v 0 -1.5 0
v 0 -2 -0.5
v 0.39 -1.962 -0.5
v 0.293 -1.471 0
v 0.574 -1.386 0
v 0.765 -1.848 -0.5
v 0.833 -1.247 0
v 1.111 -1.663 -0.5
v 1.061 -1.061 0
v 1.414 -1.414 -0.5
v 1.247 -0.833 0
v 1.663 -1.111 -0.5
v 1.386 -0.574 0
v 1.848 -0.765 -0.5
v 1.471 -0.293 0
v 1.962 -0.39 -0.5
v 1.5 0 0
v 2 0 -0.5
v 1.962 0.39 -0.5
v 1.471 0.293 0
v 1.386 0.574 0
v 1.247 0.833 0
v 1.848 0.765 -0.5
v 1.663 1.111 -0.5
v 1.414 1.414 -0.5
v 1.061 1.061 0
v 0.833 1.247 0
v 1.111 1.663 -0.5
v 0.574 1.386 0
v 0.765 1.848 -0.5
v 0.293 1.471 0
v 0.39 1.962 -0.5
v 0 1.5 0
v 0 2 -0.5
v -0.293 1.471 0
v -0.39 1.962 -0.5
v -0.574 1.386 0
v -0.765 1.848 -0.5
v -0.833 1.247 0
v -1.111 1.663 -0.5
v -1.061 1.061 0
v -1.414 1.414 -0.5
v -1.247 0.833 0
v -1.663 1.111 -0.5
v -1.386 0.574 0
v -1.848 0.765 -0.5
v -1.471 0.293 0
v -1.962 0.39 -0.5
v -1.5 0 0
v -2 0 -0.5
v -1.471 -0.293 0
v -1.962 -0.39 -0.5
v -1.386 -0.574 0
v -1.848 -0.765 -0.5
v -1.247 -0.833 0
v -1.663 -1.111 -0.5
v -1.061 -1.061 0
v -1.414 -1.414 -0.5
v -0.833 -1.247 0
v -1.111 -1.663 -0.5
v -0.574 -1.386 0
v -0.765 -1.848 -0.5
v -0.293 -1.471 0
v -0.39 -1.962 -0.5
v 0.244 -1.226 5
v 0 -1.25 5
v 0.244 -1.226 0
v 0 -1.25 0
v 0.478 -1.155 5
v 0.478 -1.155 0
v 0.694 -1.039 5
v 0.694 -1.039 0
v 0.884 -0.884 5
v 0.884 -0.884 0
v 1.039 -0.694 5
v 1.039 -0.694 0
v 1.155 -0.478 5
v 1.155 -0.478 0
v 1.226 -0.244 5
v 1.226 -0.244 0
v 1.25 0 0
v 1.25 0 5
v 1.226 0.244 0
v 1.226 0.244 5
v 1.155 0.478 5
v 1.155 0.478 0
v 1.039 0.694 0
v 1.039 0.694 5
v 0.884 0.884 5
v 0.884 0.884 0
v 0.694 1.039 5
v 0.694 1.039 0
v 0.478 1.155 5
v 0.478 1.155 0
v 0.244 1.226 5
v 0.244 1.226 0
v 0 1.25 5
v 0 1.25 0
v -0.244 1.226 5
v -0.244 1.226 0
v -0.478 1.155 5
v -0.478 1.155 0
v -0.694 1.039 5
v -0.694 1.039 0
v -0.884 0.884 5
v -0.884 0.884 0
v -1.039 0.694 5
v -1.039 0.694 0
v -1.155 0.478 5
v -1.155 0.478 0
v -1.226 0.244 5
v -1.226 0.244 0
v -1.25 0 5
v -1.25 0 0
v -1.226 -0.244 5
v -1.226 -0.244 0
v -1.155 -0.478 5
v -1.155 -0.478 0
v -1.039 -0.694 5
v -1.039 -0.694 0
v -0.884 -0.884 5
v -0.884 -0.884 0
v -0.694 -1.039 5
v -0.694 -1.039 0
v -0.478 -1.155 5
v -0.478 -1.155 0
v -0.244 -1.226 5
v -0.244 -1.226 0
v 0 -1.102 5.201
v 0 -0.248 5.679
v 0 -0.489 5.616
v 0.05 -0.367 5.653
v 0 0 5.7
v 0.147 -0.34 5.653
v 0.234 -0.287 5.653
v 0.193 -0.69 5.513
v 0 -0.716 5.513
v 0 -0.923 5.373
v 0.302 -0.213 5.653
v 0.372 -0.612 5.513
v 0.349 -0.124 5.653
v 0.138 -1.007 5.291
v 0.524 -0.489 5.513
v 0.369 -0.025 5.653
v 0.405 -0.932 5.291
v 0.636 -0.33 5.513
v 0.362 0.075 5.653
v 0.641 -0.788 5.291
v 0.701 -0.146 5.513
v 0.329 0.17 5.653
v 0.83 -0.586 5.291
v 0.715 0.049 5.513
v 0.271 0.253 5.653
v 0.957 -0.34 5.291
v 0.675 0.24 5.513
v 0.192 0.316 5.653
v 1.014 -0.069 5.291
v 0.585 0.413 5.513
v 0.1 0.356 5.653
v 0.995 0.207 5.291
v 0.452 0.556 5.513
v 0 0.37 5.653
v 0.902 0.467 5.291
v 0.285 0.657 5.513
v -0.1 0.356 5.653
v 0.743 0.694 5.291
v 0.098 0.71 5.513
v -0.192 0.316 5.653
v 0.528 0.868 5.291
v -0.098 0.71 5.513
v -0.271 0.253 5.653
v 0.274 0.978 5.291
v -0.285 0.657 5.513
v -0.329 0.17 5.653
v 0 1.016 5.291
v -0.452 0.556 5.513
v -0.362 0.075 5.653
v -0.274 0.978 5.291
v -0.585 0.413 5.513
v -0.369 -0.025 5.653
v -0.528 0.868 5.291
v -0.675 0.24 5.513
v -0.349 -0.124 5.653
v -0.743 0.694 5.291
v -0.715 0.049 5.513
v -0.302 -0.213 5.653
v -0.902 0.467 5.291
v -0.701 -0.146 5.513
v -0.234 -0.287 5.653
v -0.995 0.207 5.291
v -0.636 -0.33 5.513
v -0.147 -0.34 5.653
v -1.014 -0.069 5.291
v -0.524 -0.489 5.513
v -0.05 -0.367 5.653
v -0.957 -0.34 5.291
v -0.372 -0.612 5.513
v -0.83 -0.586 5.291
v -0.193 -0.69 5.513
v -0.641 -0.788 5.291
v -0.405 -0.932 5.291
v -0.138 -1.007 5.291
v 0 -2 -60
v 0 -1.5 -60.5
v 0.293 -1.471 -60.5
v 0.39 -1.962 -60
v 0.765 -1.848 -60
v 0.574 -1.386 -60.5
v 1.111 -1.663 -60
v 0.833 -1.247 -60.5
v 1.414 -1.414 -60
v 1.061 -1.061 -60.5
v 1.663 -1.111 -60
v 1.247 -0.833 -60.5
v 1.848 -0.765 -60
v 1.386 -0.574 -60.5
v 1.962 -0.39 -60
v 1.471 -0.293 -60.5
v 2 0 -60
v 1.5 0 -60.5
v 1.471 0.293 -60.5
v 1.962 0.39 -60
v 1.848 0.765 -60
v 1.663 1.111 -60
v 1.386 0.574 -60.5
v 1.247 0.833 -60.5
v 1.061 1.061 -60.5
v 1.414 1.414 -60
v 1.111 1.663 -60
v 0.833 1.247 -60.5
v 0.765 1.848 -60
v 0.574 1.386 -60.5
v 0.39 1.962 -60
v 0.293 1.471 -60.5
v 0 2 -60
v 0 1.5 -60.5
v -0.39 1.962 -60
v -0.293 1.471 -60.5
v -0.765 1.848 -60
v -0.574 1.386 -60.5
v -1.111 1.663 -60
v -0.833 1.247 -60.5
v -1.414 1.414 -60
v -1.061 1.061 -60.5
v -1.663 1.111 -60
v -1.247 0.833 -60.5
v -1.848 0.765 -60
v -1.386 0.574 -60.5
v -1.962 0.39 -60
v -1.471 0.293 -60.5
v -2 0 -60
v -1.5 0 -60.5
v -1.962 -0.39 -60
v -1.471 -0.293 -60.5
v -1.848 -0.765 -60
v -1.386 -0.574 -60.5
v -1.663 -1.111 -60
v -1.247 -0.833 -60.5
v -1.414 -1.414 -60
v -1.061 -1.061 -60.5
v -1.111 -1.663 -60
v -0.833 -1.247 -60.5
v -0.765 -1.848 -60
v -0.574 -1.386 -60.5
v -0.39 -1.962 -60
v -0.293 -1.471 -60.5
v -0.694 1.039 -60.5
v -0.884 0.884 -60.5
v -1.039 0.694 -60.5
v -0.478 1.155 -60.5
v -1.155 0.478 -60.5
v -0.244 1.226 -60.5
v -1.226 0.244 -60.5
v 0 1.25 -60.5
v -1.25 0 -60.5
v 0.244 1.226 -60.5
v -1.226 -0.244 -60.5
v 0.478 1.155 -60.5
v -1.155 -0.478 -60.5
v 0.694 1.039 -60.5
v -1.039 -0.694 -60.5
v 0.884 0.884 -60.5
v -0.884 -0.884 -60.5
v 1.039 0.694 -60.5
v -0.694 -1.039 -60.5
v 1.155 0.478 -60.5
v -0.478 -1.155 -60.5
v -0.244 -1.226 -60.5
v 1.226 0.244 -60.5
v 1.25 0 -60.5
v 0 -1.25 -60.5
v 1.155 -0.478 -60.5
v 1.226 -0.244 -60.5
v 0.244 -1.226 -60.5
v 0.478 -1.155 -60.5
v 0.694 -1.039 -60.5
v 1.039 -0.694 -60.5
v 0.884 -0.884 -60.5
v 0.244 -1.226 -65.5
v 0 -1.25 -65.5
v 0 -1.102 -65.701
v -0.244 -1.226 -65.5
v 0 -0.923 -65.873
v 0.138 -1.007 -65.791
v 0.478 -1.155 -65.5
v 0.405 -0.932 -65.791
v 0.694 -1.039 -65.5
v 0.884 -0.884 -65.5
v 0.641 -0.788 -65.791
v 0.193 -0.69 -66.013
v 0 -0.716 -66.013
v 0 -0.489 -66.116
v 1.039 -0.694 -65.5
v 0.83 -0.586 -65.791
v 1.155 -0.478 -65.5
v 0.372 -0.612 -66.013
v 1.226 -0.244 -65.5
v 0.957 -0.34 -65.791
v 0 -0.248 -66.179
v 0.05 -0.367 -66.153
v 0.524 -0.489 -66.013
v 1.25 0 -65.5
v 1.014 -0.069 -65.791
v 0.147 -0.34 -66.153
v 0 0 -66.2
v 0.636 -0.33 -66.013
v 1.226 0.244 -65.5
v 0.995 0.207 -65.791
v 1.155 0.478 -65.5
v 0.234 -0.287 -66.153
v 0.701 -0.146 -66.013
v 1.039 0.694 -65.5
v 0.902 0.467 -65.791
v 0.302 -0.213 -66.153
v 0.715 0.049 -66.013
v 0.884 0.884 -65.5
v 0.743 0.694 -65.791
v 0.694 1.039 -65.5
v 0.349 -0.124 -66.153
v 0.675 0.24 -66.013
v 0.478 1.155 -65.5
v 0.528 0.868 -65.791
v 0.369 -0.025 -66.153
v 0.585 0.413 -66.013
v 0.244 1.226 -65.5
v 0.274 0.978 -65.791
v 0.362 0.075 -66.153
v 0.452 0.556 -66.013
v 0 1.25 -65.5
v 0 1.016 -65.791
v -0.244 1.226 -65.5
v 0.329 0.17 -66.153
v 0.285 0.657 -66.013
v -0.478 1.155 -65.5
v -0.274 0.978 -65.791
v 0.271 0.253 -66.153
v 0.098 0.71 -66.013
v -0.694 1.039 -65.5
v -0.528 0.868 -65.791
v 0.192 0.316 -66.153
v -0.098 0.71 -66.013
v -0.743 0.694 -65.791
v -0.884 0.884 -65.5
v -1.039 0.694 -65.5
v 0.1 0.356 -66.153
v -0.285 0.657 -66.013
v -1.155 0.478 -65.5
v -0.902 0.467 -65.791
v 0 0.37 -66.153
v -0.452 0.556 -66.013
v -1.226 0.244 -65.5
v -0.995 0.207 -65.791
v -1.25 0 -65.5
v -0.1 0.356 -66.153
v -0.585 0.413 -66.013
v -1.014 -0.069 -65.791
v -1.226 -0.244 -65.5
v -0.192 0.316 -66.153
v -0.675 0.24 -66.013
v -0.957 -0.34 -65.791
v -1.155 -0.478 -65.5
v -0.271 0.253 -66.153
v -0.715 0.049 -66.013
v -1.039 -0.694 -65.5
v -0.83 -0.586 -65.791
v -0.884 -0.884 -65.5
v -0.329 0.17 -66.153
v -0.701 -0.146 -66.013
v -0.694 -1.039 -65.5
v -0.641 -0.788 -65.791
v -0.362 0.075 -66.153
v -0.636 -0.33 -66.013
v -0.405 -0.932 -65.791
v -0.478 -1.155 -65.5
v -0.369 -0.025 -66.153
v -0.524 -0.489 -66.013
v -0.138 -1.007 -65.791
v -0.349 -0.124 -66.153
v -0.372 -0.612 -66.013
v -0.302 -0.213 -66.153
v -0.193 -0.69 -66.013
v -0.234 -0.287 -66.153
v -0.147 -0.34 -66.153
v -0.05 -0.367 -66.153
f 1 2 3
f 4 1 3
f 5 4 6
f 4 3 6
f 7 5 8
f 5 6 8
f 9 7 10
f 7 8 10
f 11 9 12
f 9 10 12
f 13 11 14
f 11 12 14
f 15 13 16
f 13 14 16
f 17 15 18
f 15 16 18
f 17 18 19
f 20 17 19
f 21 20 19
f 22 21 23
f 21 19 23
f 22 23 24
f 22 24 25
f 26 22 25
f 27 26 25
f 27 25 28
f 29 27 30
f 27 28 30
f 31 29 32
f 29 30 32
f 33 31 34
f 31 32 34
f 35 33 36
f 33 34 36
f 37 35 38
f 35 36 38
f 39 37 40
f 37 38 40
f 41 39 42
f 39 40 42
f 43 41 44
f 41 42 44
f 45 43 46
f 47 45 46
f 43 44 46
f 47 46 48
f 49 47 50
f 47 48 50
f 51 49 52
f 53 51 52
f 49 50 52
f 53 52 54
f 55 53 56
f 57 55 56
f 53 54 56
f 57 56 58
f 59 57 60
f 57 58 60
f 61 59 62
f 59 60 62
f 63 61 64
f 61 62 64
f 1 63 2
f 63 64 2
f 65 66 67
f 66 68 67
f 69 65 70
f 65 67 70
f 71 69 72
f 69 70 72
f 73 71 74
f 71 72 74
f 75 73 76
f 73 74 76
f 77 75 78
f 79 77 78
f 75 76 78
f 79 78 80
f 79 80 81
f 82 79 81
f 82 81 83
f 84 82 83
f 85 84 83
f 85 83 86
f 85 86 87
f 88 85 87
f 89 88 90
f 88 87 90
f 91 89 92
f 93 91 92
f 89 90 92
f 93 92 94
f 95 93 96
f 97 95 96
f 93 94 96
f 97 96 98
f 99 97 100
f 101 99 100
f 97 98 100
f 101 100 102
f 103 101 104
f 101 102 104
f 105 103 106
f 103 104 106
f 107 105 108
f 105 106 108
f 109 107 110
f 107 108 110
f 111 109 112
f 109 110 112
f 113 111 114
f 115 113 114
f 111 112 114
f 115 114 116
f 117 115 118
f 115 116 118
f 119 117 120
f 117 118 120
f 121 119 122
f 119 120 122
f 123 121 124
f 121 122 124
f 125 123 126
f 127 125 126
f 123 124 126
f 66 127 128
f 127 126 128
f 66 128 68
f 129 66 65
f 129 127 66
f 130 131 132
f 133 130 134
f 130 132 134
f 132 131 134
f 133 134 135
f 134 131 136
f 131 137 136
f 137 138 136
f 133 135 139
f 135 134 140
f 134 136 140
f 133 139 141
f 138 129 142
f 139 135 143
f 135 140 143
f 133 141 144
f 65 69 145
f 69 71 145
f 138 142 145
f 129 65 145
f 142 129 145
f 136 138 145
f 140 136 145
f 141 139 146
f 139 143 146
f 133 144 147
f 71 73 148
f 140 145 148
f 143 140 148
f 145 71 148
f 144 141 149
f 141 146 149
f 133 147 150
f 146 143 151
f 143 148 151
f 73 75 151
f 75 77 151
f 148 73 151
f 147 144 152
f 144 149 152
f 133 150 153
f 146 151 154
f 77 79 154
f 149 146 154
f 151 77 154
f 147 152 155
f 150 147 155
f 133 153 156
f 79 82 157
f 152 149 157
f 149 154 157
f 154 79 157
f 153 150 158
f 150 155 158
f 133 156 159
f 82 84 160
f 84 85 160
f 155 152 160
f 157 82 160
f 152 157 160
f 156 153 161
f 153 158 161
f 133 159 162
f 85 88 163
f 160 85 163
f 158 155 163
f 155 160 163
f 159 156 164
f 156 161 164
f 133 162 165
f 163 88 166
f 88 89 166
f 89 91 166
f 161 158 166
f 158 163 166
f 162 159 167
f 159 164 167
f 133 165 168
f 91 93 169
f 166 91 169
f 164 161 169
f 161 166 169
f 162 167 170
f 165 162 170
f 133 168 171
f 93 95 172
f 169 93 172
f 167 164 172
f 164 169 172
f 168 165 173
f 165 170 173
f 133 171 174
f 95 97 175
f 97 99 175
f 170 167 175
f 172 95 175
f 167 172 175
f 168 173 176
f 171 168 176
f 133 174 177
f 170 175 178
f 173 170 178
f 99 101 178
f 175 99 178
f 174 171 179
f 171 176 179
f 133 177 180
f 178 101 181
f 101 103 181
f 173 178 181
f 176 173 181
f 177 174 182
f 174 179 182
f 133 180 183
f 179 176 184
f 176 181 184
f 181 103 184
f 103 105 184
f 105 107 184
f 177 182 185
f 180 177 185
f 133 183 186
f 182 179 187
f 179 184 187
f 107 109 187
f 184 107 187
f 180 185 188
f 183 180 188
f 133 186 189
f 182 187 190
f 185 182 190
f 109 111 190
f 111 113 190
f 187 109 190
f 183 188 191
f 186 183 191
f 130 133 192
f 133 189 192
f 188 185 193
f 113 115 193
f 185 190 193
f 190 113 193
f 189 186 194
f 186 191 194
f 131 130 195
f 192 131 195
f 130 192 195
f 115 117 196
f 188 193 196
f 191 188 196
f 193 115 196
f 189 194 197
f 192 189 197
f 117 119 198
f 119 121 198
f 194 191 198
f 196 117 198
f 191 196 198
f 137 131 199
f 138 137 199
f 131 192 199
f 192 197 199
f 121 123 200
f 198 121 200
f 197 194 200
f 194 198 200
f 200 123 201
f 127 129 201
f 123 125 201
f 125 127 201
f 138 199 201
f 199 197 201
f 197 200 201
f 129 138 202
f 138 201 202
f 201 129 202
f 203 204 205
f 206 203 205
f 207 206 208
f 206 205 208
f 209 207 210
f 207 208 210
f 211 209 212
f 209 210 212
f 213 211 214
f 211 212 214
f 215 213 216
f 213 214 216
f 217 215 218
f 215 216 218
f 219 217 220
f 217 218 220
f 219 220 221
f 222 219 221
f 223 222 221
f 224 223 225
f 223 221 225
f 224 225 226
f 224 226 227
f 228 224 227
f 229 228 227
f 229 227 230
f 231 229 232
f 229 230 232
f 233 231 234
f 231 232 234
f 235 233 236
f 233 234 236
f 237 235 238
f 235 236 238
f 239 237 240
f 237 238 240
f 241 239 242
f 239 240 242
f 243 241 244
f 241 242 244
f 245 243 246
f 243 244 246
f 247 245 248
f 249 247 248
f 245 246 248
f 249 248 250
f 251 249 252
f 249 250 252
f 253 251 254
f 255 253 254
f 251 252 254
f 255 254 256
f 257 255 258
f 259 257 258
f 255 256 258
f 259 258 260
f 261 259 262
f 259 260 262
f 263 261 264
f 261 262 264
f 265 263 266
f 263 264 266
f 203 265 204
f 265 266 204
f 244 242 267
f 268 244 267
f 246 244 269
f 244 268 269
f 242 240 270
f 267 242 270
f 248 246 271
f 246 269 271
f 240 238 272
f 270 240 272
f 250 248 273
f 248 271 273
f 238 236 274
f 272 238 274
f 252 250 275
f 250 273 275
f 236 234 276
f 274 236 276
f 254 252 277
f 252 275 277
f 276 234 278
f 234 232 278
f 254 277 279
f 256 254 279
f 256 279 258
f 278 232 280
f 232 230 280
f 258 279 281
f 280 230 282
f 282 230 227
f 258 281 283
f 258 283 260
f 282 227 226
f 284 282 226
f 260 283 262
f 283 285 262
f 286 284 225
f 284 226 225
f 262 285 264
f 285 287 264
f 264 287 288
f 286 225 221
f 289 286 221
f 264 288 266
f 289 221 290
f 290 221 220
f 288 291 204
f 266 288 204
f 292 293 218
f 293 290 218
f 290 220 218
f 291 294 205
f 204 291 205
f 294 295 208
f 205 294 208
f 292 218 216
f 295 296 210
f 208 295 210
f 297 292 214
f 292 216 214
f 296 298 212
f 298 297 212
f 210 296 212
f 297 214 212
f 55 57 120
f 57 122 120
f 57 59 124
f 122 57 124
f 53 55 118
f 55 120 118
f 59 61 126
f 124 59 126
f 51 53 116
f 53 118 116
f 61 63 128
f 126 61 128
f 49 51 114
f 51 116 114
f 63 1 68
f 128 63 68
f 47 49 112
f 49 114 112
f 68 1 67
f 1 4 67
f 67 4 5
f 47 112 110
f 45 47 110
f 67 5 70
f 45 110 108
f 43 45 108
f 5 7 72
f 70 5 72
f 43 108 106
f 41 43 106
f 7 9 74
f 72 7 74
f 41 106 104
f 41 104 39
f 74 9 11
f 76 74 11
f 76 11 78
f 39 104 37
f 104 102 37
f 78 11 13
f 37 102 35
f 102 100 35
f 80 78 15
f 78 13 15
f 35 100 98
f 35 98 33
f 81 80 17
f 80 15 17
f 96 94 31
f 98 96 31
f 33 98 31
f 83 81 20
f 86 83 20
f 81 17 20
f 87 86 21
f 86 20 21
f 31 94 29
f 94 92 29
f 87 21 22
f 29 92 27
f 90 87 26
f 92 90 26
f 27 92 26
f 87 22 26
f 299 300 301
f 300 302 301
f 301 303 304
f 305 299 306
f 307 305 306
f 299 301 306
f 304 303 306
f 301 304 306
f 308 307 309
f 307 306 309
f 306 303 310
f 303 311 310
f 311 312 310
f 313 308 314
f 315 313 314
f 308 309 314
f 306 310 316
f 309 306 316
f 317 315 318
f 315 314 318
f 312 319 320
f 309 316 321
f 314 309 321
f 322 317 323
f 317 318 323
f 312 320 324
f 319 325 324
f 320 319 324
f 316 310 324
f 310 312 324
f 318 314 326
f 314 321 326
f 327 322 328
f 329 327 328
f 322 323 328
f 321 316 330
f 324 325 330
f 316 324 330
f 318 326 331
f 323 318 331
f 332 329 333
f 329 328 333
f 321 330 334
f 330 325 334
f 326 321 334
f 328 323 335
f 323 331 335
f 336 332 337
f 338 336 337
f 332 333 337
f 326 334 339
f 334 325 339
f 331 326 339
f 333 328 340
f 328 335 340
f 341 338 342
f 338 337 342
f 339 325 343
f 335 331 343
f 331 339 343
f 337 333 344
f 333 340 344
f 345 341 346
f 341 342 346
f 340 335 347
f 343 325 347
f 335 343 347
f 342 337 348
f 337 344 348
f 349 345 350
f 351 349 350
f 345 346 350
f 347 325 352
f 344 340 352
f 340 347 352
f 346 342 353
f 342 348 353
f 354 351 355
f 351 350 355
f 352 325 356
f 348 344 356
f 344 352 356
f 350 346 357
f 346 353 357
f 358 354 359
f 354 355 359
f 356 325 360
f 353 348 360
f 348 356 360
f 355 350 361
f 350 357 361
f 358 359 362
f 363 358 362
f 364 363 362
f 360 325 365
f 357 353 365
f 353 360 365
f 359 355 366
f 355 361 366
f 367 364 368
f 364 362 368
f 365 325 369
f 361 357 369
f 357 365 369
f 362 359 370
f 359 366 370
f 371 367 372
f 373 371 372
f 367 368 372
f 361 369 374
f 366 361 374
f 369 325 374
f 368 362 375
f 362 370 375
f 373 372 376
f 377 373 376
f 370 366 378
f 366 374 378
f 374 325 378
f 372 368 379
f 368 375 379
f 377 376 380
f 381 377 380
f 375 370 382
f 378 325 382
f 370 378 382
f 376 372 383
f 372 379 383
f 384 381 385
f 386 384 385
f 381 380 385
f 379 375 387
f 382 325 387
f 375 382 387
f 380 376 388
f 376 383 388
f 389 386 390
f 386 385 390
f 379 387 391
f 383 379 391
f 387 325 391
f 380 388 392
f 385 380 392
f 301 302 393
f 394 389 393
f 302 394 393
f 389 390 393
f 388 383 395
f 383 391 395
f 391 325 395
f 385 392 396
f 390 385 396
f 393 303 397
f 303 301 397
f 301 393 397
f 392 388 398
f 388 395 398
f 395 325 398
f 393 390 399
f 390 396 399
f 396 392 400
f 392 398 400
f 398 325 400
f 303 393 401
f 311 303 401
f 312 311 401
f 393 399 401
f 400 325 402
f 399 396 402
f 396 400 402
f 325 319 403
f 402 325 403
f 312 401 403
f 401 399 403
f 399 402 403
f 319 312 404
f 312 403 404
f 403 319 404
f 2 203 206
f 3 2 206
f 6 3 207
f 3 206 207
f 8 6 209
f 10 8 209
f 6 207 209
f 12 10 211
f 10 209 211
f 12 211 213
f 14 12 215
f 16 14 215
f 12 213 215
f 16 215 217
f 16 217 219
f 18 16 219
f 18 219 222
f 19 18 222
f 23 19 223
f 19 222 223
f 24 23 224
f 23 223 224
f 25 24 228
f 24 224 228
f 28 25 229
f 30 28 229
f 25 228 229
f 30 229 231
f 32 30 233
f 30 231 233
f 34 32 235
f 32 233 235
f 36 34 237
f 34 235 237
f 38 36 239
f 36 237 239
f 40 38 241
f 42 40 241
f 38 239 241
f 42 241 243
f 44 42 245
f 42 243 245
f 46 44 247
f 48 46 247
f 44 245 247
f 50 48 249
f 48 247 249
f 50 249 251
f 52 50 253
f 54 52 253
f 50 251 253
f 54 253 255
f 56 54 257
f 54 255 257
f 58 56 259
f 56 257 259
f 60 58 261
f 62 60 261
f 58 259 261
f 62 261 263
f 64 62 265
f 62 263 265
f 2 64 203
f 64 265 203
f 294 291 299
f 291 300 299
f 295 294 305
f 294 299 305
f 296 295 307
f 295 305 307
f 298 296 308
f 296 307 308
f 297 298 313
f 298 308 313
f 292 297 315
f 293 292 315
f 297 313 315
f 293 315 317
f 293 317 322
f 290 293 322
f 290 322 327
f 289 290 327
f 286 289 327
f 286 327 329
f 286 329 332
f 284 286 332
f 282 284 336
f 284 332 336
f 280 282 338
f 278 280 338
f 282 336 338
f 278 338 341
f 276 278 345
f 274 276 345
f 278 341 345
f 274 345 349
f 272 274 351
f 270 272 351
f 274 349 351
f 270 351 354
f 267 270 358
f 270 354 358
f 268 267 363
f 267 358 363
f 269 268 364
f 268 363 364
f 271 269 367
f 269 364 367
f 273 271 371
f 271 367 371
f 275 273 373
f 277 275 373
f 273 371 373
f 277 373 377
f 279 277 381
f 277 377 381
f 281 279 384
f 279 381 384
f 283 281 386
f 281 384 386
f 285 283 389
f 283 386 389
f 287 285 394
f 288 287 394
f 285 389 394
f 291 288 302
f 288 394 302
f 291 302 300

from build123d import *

# Parameters (mm, degrees)
CHAMFER1_SIZE = 0.5


with BuildPart() as part:
    # Sketch2 → Revolve1 (revolve)
    with BuildSketch(Plane(origin=(0, 0, 0), x_dir=(0, 0, -1), z_dir=(1, 0, 0))):
        with BuildLine():
            Line((65.5, 0), (-5, 0))
            Line((-5, 0), (-5.7, 0))
            ThreePointArc((-5.7, 0), (-5.513084713, -0.716327439), (-5, -1.25))
            Line((-5, -1.25), (0, -1.25))
            Line((0, -1.25), (0, -2))
            Line((0, -2), (60.5, -2))
            Line((60.5, -2), (60.5, -1.25))
            Line((60.5, -1.25), (65.5, -1.25))
            ThreePointArc((65.5, -1.25), (66.013084713, -0.716327439), (66.2, 0))
            Line((66.2, 0), (65.5, 0))
        make_face()
    revolve(axis=Axis((0, 0, -65.5), (0, 0, 1)))

    # Chamfer1
    chamfer1_edges = [part.edges().sort_by_distance(p)[0] for p in [
        (0, 2, -60.5),
        (0, 2, 0),
    ]]
    chamfer(chamfer1_edges, length=CHAMFER1_SIZE)


solid = part.part
